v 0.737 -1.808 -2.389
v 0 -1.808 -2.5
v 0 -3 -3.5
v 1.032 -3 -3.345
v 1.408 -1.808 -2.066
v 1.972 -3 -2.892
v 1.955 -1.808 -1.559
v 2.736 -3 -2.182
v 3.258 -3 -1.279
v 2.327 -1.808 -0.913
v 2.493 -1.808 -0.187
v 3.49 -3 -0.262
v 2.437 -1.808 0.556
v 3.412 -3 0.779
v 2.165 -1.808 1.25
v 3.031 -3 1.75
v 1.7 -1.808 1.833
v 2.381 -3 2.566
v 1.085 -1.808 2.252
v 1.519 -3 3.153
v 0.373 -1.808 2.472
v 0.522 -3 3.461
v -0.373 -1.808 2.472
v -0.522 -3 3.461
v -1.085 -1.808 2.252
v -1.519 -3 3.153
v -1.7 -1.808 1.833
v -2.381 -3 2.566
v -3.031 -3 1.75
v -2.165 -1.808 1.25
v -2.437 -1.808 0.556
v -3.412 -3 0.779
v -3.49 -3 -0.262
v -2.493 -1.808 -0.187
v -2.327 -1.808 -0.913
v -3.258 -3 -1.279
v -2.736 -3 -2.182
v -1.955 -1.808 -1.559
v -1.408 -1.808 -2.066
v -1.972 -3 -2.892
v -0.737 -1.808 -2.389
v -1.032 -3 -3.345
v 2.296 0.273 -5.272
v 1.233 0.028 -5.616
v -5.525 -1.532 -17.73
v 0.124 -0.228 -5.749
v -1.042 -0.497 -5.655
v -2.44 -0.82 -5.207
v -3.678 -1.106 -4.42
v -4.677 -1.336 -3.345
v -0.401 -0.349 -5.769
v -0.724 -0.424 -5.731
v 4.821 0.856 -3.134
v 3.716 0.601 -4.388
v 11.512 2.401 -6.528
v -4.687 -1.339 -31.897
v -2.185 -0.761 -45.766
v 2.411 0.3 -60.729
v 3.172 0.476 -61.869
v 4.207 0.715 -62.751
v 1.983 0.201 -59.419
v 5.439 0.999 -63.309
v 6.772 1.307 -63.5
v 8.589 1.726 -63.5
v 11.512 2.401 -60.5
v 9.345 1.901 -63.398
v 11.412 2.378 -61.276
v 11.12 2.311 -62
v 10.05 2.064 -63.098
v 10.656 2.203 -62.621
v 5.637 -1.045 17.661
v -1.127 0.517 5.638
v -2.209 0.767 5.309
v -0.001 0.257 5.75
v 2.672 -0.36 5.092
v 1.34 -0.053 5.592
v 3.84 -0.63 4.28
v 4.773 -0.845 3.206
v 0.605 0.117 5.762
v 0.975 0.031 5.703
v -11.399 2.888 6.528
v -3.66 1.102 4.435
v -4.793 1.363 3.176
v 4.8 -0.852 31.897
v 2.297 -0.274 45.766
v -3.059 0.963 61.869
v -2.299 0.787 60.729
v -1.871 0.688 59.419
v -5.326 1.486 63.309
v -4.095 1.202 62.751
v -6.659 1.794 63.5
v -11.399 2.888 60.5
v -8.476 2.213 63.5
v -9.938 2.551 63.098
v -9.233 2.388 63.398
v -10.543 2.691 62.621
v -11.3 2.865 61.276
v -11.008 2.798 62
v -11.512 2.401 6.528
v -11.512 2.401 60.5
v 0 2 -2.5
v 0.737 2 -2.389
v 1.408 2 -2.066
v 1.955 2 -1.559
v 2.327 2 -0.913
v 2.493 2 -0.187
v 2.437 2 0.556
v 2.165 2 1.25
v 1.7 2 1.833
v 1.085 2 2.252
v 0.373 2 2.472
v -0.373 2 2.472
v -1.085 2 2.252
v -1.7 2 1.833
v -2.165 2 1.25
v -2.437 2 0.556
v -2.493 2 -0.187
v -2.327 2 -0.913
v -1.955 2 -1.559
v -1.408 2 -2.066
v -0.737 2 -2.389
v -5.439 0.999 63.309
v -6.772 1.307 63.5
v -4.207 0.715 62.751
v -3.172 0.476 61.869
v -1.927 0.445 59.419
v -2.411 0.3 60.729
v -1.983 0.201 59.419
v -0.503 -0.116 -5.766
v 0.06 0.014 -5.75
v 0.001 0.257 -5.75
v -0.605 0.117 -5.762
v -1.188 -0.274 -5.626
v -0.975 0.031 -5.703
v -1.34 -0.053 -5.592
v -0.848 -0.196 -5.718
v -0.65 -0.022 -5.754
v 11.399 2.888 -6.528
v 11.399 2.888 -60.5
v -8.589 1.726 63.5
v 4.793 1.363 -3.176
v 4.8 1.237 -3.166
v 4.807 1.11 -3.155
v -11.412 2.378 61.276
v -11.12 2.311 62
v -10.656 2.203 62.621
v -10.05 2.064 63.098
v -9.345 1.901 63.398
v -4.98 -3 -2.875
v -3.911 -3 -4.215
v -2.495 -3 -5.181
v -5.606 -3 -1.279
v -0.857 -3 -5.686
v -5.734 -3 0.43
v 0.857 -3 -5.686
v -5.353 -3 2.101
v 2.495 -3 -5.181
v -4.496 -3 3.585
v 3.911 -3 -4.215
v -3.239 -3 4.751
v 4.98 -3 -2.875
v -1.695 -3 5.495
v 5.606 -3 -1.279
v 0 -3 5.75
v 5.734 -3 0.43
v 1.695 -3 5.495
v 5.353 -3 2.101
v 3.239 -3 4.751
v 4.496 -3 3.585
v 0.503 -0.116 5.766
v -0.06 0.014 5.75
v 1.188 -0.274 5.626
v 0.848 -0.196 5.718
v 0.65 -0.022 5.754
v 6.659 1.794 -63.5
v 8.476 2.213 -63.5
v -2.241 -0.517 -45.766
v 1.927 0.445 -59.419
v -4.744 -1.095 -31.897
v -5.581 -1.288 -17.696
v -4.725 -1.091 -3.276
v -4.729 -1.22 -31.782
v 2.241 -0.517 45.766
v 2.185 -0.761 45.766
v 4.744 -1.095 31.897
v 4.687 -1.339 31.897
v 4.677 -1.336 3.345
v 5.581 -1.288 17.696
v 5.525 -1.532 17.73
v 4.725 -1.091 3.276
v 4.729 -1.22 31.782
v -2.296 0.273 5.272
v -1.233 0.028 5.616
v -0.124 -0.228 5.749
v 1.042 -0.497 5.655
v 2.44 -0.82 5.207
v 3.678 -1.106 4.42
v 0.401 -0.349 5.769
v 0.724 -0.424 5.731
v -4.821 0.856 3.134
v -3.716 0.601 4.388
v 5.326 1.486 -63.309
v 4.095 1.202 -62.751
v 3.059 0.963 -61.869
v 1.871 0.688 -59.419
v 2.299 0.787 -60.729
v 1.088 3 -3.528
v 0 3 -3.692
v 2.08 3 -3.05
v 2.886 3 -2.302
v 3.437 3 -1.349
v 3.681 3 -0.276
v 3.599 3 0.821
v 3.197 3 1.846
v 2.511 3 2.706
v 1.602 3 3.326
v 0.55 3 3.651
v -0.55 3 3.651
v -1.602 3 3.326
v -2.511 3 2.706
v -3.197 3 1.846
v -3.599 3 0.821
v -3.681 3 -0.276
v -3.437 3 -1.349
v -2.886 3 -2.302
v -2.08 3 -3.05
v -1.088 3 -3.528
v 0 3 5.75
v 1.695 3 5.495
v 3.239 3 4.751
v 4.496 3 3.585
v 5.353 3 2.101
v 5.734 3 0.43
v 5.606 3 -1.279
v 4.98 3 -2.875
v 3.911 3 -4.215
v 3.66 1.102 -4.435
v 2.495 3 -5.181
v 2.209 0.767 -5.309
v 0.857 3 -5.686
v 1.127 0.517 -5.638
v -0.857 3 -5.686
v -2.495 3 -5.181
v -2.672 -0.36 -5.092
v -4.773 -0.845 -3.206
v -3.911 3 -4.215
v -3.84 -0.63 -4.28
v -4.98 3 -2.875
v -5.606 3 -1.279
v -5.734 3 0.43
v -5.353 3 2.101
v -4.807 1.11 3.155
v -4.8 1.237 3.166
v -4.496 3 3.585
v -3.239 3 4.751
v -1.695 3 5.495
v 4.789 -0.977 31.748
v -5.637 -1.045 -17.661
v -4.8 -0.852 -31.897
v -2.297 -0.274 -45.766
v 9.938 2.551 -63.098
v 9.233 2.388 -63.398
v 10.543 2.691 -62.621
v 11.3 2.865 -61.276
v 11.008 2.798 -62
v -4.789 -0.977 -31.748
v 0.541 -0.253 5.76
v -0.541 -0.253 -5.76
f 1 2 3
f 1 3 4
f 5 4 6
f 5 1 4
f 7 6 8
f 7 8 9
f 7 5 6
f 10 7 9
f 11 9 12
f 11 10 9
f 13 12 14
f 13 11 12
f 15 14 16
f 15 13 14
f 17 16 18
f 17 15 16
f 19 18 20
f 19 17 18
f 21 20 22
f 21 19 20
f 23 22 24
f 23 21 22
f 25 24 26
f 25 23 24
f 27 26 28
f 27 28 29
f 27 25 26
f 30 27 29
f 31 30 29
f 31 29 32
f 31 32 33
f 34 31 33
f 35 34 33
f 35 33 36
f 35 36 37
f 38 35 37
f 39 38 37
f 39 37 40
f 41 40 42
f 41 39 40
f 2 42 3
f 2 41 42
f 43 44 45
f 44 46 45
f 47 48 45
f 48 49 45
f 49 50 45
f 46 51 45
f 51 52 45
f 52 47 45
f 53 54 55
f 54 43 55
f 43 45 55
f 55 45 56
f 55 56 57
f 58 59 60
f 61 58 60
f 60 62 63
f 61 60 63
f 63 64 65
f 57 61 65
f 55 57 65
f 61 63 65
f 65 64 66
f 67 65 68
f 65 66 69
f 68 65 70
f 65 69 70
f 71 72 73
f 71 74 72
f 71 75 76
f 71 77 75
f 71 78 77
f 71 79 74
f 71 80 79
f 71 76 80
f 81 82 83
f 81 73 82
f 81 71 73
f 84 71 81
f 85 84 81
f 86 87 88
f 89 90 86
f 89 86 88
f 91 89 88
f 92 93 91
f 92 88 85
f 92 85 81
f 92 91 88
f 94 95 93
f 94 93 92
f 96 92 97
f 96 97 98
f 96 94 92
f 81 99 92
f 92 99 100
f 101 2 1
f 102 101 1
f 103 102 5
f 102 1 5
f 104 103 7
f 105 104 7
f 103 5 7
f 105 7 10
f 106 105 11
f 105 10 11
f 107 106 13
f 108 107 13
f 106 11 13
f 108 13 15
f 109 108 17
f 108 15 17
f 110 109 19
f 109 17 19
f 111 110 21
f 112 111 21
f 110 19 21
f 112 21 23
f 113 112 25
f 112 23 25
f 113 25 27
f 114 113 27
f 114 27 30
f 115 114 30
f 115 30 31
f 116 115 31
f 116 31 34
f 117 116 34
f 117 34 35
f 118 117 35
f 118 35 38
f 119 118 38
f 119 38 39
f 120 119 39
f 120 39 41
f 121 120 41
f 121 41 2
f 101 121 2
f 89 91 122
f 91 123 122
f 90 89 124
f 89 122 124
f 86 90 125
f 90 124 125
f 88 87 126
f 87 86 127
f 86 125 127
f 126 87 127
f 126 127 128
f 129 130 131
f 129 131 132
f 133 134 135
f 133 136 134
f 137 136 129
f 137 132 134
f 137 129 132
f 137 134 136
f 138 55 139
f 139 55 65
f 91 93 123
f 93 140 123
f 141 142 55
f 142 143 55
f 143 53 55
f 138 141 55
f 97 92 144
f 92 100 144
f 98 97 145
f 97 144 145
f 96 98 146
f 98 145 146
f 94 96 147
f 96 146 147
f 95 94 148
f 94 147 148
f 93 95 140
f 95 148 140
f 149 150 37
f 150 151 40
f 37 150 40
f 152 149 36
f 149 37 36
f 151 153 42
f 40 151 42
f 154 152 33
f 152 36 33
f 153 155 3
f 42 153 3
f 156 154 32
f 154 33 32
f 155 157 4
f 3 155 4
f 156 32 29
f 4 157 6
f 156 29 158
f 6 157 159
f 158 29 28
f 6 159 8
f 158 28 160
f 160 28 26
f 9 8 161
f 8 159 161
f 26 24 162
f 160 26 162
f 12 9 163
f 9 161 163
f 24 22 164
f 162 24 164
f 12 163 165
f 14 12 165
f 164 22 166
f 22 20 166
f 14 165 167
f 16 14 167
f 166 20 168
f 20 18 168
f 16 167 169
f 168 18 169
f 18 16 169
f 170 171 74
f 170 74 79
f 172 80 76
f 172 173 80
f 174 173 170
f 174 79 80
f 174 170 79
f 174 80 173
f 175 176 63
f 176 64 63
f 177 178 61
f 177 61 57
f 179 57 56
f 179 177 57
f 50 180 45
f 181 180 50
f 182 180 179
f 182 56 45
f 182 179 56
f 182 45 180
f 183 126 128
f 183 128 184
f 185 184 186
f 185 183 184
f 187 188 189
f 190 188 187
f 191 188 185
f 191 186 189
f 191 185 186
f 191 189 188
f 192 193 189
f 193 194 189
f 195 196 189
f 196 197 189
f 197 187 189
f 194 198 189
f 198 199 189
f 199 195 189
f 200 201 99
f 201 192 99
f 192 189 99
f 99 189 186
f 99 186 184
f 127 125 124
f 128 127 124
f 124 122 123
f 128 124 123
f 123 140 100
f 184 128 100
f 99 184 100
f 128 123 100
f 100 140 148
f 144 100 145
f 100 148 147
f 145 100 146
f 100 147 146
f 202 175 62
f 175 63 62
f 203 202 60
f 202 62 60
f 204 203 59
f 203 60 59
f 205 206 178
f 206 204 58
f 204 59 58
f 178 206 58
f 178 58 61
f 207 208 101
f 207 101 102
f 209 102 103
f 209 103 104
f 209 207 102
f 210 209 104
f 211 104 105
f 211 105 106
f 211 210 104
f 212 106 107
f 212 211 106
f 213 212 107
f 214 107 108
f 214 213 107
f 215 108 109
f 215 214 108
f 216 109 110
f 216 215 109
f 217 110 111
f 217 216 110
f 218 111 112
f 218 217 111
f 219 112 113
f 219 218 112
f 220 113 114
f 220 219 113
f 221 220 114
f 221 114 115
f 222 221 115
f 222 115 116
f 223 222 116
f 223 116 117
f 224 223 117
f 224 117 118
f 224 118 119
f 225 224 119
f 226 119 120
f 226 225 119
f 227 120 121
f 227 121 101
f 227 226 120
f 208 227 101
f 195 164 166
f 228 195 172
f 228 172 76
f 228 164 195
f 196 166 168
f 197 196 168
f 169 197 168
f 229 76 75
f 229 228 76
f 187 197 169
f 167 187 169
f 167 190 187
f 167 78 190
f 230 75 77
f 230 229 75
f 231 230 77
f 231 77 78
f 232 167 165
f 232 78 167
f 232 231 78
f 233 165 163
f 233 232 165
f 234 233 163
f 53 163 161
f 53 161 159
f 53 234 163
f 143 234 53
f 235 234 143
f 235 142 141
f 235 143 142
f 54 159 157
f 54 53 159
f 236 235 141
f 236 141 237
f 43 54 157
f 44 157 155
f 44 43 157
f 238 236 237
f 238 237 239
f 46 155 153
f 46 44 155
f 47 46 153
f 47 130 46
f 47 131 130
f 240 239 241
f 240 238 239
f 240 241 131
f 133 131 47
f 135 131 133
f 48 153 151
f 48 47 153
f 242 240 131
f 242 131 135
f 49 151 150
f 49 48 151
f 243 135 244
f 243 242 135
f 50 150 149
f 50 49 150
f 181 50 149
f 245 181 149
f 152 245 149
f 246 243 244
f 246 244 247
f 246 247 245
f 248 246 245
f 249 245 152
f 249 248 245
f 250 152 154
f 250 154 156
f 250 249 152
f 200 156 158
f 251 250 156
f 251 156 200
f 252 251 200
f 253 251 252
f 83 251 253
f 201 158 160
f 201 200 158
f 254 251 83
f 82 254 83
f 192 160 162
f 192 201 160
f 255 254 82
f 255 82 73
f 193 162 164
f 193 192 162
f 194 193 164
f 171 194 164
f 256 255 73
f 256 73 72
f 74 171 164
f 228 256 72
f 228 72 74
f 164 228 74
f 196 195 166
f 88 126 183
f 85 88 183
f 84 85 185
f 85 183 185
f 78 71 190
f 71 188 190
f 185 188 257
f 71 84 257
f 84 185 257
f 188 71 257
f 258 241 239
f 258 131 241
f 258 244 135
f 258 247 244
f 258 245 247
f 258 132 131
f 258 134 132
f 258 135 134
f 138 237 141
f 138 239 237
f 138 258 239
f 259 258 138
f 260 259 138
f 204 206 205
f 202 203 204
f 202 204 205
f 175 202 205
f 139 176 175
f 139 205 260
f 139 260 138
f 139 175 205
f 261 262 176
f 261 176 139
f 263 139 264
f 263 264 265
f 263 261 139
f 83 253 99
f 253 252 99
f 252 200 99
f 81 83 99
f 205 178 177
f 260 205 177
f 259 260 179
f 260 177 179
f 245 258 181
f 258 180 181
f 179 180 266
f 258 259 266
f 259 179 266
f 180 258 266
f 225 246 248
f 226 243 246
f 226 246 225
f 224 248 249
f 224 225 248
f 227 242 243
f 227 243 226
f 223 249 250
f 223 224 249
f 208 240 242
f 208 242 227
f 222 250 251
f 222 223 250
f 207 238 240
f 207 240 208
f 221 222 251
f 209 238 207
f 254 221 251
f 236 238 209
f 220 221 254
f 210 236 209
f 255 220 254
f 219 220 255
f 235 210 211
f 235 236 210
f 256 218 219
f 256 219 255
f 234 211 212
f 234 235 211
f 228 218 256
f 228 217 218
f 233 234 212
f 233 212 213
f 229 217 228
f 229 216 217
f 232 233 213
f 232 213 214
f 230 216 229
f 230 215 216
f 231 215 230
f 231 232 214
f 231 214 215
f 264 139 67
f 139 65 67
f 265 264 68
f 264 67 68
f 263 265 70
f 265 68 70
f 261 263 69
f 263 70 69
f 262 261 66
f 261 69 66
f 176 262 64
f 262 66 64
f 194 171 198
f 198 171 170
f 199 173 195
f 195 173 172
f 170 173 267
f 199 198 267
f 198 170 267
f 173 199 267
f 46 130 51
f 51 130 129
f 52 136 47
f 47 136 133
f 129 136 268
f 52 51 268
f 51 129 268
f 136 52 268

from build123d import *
from OCP.BRepFilletAPI import BRepFilletAPI_MakeChamfer

# Parameters (mm, degrees)
SKETCH1_R           = 5.75
BOSS_EXTRUDE1_DEPTH = 3
BOSS_EXTRUDE2_DEPTH = 0.25
CIRPATTERN2_COUNT   = 2
SKETCH5_R           = 2.5
CUT_EXTRUDE2_DEPTH  = 65.81337733
CHAMFER1_SIZE       = 1
CHAMFER1_SIZE2      = 1.191753593
CIRPATTERN1_COUNT   = 2


with BuildPart() as part:
    # Sketch1 → Boss-Extrude1 (new, symmetric)
    with BuildSketch(Plane(origin=(0, 0, 0), x_dir=(1, 0, 0), z_dir=(0, 1, 0))):
        with Locations(Location((0, 0, 0), (0, 0, 270))):
            Circle(SKETCH1_R)
    extrude(amount=BOSS_EXTRUDE1_DEPTH, both=True)

    # Sketch3 → Boss-Extrude2 (add, symmetric)
    with BuildSketch(Plane(origin=(0, 0, 0), x_dir=(0.9743700647852351, -0.22495105434386545, 0), z_dir=(-0.22495105434386545, -0.9743700647852351, 0))):
        with BuildLine():
            Line((-4.217884967, 2.801368956), (-11.756994241, 6.527912594))
            Line((-11.756994241, 6.527912594), (-11.756994241, 60.5))
            ThreePointArc((-11.756994241, 60.5), (-10.878314584, 62.621320344), (-8.756994241, 63.5))
            Line((-8.756994241, 63.5), (-6.892338734, 63.5))
            ThreePointArc((-6.892338734, 63.5), (-3.698351895, 62.346875105), (-1.977591351, 59.419379228))
            add(Edge.make_bspline(
                [(-1.977591351, 59.419379228), (8.598166734, 31.505186927), (4.658441713, 1.76136177)],
                knots=[0, 0, 0, 1, 1, 1], degree=2))
            add(Edge.make_bspline(
                [(-4.217884967, 2.801368956), (1.070543738, 9.225844279), (4.658441713, 1.76136177)],
                knots=[0, 0, 0, 1, 1, 1], degree=2))
        make_face()
    boss_extrude2 = extrude(amount=BOSS_EXTRUDE2_DEPTH, both=True)

    # CirPattern2: Boss-Extrude2 ×2 about axis
    cirpattern2_axis = Axis((0, 3, 0), (0, -1, 0))
    for i in range(1, CIRPATTERN2_COUNT):
        add(boss_extrude2.rotate(cirpattern2_axis, i * 360 / CIRPATTERN2_COUNT))

    # Sketch5 → Cut-Extrude2 (cut, through all)
    with BuildSketch(Plane.XZ.offset(3)):
        with Locations(Location((0, 0, 0), (0, 0, 270))):
            Circle(SKETCH5_R)
    extrude(amount=-CUT_EXTRUDE2_DEPTH, mode=Mode.SUBTRACT)

    # Chamfer1: one chamfer whose edges measure the first distance from different faces: ONE call of the kernel's chamfer builder (chamfer() names one face for all edges)
    chamfer1_edges_1 = [part.edges().sort_by_distance(p)[0] for p in [
        (0, 3, 2.5),
    ]]
    chamfer1_side_1 = [part.faces().sort_by_distance(p)[0] for p in [
        (0, 0, 2.5),
    ]]
    chamfer1_edges_2 = [part.edges().sort_by_distance(p)[0] for p in [
        (0, -3, 2.5),
    ]]
    chamfer1_side_2 = [part.faces().sort_by_distance(p)[0] for p in [
        (0, -3, -5.58736544),
    ]]
    chamfer1 = BRepFilletAPI_MakeChamfer(part.part.solid().wrapped)
    for e in chamfer1_edges_1:
        chamfer1.Add(CHAMFER1_SIZE, CHAMFER1_SIZE2, e.wrapped, chamfer1_side_1[0].wrapped)  # the first distance lies on this face
    for e in chamfer1_edges_2:
        chamfer1.Add(CHAMFER1_SIZE, CHAMFER1_SIZE2, e.wrapped, chamfer1_side_2[0].wrapped)  # the first distance lies on this face
    add(Compound.cast(chamfer1.Shape()), mode=Mode.REPLACE)

    # CirPattern1: Boss-Extrude2 ×2 about axis
    cirpattern1_axis = Axis((0, 3, 0), (0, -1, 0))
    for i in range(1, CIRPATTERN1_COUNT):
        add(boss_extrude2.rotate(cirpattern1_axis, i * 360 / CIRPATTERN1_COUNT))


solid = part.part
